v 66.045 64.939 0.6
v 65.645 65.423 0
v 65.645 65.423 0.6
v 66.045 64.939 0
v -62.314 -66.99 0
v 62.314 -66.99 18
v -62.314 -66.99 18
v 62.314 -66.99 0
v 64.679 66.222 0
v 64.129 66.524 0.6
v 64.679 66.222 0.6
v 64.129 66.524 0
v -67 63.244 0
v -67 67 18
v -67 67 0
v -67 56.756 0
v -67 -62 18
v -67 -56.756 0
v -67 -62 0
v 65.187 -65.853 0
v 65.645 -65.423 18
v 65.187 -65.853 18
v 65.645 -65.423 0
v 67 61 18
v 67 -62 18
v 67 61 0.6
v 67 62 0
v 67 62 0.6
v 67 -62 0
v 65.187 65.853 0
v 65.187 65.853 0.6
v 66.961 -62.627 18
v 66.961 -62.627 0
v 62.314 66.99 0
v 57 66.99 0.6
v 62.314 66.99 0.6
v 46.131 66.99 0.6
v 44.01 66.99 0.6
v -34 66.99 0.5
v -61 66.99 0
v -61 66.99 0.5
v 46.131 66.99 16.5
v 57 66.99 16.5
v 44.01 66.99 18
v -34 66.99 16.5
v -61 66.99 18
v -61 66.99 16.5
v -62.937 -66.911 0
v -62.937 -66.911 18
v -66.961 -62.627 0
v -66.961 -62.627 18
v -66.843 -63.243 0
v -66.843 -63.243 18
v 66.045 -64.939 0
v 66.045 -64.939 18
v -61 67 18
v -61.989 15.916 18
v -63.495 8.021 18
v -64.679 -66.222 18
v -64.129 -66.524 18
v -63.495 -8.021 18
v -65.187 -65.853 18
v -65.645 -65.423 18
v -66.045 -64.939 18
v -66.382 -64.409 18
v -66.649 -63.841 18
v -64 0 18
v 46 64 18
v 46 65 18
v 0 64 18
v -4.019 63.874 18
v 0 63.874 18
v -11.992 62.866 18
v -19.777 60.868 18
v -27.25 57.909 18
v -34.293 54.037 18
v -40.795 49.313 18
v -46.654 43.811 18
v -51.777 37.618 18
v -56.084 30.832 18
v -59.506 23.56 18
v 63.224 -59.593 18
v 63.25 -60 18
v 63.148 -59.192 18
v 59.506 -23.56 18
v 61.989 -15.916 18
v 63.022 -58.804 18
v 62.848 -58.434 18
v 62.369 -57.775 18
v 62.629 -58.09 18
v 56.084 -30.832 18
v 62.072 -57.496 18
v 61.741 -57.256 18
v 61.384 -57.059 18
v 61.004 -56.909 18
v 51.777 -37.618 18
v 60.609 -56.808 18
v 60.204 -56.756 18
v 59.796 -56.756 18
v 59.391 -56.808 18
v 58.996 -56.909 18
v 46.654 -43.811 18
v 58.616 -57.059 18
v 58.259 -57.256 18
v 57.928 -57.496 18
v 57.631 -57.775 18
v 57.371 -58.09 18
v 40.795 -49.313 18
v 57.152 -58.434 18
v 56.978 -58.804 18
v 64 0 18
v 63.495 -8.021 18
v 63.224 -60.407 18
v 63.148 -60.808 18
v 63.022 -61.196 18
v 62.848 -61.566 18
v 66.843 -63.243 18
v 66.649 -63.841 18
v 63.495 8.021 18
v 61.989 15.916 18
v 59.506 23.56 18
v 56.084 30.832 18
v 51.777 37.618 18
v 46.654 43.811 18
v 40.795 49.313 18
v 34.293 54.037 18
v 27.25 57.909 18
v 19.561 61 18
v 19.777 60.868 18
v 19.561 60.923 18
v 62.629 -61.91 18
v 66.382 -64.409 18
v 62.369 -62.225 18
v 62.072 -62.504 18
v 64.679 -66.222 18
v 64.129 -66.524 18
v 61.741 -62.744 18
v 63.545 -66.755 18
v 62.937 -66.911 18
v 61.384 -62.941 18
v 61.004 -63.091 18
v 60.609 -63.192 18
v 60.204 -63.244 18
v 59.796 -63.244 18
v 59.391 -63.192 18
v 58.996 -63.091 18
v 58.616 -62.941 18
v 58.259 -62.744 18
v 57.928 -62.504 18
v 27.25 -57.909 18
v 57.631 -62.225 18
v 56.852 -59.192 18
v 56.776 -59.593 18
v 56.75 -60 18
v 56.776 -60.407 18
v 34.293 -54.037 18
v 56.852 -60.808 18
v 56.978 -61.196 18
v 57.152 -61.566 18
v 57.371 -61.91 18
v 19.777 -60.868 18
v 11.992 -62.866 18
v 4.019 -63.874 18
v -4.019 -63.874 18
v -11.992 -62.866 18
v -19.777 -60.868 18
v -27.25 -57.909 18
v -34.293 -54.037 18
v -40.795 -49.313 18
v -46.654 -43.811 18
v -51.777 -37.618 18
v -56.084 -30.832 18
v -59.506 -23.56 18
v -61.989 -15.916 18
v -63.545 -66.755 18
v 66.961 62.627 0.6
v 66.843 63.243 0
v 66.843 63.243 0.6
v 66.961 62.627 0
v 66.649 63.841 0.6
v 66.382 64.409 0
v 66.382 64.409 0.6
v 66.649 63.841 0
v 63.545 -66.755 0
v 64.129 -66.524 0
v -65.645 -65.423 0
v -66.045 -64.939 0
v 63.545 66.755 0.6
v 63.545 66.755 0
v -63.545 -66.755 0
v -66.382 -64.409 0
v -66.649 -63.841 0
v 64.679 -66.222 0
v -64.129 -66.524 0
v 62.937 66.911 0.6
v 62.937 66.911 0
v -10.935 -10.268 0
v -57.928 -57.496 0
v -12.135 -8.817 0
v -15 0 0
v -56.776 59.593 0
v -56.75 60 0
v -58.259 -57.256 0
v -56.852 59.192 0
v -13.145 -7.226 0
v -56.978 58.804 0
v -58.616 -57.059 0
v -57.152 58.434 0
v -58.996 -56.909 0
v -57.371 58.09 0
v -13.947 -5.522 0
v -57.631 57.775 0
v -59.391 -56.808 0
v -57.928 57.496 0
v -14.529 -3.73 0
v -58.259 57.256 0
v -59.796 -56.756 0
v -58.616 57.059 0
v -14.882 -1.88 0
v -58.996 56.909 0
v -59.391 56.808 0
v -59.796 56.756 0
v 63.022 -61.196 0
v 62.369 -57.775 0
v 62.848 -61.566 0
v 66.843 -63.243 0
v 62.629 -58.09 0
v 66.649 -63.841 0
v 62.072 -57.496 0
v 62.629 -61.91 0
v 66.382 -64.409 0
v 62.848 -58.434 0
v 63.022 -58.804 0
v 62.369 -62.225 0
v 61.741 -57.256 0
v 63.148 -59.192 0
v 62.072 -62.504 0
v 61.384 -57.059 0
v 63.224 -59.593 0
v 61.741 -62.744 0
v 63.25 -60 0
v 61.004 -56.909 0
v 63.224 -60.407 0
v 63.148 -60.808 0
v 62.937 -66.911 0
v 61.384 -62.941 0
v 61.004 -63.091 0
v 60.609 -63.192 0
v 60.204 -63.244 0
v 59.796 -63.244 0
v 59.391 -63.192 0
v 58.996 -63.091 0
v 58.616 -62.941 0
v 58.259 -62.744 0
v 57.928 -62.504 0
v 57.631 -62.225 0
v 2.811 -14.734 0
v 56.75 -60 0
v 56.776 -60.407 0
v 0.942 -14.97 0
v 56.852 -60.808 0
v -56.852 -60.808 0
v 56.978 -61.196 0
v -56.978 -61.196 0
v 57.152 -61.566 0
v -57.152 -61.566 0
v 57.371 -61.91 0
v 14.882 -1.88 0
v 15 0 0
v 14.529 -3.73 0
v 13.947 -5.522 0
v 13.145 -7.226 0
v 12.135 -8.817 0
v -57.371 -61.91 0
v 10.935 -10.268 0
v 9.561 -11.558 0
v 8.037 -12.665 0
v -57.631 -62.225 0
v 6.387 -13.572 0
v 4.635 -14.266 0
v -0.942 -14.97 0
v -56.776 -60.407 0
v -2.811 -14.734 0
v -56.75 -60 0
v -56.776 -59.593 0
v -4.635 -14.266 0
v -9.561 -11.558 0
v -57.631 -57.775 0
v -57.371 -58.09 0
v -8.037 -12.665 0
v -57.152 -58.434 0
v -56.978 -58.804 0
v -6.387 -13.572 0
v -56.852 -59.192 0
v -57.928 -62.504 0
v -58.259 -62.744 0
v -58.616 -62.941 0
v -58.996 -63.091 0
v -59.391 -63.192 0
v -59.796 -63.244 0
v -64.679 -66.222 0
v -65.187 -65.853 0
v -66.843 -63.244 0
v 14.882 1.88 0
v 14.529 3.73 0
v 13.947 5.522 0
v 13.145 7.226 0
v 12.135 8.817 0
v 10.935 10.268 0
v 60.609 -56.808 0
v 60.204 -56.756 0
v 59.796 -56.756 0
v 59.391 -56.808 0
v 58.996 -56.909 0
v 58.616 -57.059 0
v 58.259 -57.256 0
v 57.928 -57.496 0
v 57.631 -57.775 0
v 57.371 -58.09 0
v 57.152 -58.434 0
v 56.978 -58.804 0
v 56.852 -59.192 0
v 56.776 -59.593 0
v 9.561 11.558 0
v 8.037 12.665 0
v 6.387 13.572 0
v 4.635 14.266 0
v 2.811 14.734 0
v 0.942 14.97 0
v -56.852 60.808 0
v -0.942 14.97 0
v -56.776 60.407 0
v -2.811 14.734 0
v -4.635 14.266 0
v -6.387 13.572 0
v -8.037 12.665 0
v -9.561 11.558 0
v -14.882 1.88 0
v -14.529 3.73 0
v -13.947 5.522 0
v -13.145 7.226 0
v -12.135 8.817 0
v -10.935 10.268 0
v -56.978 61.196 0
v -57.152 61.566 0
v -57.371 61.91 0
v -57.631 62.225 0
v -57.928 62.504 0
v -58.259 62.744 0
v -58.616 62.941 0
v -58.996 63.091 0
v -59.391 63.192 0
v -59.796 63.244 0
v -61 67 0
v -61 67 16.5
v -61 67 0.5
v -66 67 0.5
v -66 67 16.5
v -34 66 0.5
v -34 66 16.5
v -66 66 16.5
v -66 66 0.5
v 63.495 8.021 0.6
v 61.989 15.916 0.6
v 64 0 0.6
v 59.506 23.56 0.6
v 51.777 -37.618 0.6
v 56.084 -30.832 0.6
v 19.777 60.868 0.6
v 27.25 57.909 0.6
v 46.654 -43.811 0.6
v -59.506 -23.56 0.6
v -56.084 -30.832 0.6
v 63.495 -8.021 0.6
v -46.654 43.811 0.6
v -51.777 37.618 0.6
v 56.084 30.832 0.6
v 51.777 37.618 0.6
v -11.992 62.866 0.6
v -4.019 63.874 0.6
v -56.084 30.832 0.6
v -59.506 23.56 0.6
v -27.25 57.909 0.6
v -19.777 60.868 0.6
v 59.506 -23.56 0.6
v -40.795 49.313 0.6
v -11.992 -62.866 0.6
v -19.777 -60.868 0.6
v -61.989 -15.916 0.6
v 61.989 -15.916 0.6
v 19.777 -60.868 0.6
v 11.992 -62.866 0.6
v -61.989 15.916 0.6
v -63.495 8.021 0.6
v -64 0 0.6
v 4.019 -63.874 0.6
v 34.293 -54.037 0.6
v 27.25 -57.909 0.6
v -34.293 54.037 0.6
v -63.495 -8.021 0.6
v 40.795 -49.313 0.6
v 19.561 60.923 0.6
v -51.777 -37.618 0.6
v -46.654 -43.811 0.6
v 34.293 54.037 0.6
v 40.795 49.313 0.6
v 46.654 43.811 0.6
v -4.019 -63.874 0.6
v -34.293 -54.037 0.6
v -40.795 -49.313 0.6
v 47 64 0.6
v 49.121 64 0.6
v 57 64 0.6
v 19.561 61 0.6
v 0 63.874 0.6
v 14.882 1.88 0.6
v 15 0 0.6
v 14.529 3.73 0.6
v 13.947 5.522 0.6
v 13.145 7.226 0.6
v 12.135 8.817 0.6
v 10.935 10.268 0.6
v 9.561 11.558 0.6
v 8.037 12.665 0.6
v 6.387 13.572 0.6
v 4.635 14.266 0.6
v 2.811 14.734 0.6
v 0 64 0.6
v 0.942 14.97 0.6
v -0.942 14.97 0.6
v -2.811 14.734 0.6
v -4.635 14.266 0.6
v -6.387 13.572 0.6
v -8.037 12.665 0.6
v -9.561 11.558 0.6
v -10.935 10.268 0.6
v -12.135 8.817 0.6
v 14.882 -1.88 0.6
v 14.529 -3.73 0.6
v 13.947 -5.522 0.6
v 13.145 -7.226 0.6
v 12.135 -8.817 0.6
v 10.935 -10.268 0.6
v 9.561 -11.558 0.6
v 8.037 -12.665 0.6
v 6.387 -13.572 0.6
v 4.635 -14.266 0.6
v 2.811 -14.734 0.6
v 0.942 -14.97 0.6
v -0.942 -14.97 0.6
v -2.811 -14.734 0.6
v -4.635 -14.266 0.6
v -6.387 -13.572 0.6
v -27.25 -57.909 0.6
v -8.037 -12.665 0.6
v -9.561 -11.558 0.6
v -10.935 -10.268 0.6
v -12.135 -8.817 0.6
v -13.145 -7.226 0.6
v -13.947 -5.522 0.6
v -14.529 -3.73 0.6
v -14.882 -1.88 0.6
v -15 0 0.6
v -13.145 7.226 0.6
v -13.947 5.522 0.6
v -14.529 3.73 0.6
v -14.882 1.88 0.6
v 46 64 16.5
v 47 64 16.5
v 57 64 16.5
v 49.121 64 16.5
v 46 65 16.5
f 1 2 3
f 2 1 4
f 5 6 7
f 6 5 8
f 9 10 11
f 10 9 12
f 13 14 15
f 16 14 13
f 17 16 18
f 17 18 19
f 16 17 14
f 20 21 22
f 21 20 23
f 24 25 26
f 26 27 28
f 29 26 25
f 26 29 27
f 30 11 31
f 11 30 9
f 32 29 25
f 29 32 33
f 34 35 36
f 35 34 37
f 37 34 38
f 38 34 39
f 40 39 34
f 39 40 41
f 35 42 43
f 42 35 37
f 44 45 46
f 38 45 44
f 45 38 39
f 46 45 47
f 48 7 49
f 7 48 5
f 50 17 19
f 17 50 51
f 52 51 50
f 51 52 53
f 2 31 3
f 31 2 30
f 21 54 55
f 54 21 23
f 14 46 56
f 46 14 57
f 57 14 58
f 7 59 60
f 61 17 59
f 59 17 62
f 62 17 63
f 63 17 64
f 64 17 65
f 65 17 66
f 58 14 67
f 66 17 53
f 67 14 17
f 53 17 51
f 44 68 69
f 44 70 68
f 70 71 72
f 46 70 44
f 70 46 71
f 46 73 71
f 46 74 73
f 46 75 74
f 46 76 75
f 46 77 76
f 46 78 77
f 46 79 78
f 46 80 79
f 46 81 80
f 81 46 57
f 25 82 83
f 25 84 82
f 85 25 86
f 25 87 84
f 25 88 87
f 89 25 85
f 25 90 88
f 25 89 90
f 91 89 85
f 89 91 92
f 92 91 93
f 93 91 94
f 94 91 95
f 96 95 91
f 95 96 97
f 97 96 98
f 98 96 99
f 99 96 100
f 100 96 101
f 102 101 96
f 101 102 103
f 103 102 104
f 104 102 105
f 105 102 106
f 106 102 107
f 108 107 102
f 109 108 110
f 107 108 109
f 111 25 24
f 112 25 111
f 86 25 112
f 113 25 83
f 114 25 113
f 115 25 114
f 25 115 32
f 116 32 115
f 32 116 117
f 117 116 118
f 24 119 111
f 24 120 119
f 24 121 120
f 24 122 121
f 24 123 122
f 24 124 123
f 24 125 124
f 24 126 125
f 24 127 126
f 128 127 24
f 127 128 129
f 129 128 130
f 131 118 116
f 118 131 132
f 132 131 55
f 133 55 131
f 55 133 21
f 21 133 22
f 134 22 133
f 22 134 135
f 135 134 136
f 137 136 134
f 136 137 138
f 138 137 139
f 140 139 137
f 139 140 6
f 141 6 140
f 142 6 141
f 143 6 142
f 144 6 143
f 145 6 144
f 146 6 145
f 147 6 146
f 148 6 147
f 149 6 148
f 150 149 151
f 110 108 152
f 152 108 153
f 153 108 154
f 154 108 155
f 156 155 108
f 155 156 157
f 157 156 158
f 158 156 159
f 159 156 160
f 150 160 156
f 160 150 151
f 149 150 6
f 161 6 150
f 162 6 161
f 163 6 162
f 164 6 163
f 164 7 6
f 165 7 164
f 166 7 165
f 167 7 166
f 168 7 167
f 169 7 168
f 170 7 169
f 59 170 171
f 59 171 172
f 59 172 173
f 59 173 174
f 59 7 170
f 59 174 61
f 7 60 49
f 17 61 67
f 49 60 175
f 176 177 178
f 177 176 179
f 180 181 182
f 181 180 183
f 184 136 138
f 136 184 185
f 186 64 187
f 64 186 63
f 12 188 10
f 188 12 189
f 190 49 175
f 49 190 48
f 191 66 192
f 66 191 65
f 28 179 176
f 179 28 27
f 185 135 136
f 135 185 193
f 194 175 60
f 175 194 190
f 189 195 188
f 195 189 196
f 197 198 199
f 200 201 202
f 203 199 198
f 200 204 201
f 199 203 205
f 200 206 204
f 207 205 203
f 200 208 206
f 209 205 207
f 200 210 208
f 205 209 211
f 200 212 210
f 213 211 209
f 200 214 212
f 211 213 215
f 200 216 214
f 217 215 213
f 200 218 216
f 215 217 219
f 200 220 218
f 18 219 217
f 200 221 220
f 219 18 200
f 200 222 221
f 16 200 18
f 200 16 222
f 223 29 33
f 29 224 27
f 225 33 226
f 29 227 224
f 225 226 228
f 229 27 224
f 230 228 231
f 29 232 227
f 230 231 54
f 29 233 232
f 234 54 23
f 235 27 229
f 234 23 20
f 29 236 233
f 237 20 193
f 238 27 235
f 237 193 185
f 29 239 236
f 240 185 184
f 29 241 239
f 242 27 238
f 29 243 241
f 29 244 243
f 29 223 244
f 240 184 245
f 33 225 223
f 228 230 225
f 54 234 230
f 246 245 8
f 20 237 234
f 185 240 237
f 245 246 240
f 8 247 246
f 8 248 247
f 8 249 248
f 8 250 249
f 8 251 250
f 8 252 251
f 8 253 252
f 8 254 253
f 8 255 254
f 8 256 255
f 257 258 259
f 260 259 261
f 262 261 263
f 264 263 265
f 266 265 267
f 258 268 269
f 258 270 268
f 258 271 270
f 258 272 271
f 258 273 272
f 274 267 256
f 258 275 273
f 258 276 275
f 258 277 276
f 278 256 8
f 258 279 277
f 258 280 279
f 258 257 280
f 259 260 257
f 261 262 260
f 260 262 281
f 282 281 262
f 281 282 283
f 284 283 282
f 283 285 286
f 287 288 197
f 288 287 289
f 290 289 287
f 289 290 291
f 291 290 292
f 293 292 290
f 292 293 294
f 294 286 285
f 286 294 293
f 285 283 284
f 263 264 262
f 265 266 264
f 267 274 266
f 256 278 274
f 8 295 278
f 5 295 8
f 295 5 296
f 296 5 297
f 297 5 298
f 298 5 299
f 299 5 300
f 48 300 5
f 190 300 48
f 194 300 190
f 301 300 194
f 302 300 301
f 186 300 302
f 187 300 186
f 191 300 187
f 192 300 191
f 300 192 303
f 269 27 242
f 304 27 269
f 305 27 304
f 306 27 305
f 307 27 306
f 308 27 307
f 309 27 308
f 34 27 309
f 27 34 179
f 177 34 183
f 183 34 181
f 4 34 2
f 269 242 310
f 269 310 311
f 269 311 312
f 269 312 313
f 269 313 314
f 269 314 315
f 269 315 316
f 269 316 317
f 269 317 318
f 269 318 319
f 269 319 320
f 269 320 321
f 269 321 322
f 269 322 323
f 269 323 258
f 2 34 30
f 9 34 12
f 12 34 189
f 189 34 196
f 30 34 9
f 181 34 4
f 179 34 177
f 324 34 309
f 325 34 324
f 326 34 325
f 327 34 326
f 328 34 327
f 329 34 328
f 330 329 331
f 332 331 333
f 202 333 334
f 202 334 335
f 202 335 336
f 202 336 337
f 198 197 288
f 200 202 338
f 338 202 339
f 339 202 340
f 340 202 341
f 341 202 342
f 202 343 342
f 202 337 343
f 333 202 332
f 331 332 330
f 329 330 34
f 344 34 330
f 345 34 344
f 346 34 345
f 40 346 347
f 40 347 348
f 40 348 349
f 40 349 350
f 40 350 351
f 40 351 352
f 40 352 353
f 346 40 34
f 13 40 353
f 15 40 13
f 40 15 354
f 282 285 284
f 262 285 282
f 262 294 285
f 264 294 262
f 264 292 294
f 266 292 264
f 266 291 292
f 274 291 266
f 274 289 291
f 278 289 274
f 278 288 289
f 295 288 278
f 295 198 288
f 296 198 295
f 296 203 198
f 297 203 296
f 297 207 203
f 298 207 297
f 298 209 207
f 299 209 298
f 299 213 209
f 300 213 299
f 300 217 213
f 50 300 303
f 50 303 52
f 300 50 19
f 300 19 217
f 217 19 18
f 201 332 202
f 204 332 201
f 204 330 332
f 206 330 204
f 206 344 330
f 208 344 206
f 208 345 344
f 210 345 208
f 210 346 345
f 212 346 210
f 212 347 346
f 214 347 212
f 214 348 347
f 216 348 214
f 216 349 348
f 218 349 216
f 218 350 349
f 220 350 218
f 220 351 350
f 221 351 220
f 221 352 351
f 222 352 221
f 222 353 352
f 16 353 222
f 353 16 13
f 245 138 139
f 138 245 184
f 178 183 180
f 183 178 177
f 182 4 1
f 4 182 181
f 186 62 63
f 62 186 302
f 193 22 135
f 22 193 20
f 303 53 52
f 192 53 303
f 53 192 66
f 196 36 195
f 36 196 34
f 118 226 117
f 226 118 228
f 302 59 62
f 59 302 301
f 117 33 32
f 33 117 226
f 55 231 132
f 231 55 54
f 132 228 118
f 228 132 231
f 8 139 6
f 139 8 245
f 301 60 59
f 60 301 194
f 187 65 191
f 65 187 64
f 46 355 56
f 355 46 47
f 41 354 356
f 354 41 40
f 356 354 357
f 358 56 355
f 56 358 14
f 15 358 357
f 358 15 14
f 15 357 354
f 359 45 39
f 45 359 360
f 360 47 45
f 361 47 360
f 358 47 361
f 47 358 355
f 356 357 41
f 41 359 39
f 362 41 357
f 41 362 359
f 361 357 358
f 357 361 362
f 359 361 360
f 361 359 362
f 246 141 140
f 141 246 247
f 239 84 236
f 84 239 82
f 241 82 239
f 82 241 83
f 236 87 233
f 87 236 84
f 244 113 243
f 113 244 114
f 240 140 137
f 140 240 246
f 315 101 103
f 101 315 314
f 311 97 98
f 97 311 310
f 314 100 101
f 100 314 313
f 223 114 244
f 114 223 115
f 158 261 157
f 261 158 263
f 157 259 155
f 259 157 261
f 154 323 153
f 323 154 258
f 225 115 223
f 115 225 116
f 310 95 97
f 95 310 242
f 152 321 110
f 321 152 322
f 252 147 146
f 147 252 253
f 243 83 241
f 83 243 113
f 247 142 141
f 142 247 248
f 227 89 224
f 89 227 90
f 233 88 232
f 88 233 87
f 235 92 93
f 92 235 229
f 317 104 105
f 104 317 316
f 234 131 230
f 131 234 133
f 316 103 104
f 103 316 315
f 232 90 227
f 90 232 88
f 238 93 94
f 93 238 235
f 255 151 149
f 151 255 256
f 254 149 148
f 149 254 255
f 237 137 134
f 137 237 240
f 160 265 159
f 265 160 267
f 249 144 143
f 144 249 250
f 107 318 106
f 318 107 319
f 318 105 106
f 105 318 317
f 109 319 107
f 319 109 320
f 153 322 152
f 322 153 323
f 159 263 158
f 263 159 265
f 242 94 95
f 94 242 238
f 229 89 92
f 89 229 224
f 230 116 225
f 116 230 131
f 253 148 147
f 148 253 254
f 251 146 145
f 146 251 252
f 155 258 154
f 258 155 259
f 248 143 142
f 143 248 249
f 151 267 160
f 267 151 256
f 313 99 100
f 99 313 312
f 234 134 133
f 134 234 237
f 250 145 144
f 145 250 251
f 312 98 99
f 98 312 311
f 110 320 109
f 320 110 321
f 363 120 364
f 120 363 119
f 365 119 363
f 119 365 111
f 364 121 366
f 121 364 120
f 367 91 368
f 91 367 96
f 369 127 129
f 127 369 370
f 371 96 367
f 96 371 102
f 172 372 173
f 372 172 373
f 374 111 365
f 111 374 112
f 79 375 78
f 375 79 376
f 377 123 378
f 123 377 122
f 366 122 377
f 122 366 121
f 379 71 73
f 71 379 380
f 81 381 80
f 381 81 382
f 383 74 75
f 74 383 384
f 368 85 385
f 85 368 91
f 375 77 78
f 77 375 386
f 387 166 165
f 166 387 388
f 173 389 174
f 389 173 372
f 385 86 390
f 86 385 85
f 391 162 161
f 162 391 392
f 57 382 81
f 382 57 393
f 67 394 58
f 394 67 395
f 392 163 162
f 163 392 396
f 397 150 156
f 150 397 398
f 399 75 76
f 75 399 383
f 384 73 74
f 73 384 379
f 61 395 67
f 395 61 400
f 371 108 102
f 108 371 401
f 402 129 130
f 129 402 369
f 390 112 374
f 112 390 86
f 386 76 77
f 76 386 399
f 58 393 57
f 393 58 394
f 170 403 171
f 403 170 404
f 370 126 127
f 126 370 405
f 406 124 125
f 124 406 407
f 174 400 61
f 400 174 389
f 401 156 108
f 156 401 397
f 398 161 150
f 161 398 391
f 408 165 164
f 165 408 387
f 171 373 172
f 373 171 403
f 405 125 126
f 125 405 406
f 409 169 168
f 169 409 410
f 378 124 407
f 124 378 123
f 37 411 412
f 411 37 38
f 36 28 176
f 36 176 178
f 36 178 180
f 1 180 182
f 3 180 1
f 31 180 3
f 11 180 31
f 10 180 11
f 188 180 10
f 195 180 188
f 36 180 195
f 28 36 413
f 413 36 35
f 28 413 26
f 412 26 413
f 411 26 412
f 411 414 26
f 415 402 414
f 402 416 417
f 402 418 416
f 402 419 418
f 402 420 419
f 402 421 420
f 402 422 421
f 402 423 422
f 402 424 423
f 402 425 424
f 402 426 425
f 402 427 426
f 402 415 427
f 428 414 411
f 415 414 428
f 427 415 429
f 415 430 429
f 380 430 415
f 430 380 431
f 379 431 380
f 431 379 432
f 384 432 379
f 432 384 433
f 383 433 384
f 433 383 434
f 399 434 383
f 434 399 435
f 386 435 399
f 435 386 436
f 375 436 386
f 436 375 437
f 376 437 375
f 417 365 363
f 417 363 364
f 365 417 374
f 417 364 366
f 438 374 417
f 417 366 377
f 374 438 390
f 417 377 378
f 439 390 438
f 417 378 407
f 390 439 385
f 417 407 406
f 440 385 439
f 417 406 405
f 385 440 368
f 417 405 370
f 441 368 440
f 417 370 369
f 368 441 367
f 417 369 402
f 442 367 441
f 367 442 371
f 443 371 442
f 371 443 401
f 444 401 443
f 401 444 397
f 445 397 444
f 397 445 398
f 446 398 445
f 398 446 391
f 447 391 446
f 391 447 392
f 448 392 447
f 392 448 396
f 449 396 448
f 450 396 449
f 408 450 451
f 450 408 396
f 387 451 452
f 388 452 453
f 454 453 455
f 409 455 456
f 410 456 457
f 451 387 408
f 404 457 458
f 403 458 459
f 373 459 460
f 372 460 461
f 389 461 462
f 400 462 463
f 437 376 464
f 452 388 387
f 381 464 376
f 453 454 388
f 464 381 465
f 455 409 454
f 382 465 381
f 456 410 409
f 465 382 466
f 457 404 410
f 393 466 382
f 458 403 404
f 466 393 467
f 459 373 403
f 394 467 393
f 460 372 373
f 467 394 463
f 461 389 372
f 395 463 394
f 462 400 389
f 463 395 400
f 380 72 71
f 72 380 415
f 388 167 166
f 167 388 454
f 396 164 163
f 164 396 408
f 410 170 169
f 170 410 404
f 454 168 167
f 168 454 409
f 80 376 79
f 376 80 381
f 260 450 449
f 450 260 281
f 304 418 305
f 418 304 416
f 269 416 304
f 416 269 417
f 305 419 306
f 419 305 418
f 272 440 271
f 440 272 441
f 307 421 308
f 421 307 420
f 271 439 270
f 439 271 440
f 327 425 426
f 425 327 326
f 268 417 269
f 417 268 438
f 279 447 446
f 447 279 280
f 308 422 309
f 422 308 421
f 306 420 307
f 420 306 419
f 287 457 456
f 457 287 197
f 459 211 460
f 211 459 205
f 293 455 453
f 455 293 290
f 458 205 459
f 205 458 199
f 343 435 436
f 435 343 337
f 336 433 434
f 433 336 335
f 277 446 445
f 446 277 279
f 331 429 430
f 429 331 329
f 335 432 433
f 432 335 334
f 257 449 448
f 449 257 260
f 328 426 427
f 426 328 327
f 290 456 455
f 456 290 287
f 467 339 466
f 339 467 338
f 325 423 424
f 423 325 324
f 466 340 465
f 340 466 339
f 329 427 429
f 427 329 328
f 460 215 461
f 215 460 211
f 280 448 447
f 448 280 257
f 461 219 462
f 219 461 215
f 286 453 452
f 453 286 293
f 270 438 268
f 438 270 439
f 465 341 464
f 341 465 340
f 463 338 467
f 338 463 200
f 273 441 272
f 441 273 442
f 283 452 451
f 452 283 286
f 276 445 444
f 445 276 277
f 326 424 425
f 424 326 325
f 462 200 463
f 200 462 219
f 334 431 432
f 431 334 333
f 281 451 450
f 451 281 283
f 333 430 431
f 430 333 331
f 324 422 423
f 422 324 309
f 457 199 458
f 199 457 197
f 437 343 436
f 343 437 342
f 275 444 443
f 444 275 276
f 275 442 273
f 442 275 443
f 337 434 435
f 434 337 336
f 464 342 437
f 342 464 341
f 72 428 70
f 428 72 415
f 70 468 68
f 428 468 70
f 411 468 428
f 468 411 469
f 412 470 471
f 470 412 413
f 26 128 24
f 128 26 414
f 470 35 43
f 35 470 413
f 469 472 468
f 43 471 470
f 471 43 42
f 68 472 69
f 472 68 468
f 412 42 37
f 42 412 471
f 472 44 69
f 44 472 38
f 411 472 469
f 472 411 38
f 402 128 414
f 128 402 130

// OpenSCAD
$fn = 50;


difference() {
	union() {
		hull() {
			translate(v = [-62.0000000000, 62.0000000000, 0]) {
				cylinder(h = 18, r = 5);
			}
			translate(v = [62.0000000000, 62.0000000000, 0]) {
				cylinder(h = 18, r = 5);
			}
			translate(v = [-62.0000000000, -62.0000000000, 0]) {
				cylinder(h = 18, r = 5);
			}
			translate(v = [62.0000000000, -62.0000000000, 0]) {
				cylinder(h = 18, r = 5);
			}
		}
		translate(v = [-67.0000000000, 61.0000000000, 0]) {
			cube(size = [6, 6, 18]);
		}
	}
	union() {
		translate(v = [-67.5000000000, -60.0000000000, -250.0000000000]) {
			rotate(a = [0, 0, 0]) {
				difference() {
					union() {
						hull() {
							translate(v = [7.5000000000, 0, 0]) {
								cylinder(h = 250, r = 3.2500000000, r1 = 3.2500000000, r2 = 3.2500000000);
							}
							translate(v = [-7.5000000000, 0, 0]) {
								cylinder(h = 250, r = 3.2500000000, r1 = 3.2500000000, r2 = 3.2500000000);
							}
						}
					}
					union();
				}
			}
		}
		translate(v = [-67.5000000000, 60.0000000000, -250.0000000000]) {
			rotate(a = [0, 0, 0]) {
				difference() {
					union() {
						hull() {
							translate(v = [7.5000000000, 0, 0]) {
								cylinder(h = 250, r = 3.2500000000, r1 = 3.2500000000, r2 = 3.2500000000);
							}
							translate(v = [-7.5000000000, 0, 0]) {
								cylinder(h = 250, r = 3.2500000000, r1 = 3.2500000000, r2 = 3.2500000000);
							}
						}
					}
					union();
				}
			}
		}
		translate(v = [-66.0000000000, 66.0000000000, 0.5000000000]) {
			cube(size = [32, 1, 16]);
		}
		translate(v = [60.0000000000, -60.0000000000, -50.0000000000]) {
			cylinder(h = 100, r = 3.2500000000);
		}
		translate(v = [0, 0, 0.6000000000]) {
			cylinder(h = 20.4000000000, r = 64.0000000000);
		}
		translate(v = [0, 0, -9.0000000000]) {
			cylinder(h = 18, r = 15.0000000000);
		}
		translate(v = [0.0000000000, 61.0000000000, 0.6000000000]) {
			cube(size = [67.0000000000, 3, 20.4000000000]);
		}
		translate(v = [57.0000000000, 61.0000000000, 0.6000000000]) {
			cube(size = [10, 6, 20.4000000000]);
		}
		translate(v = [46.0000000000, 61.0000000000, 16.5000000000]) {
			cube(size = [21, 6, 1.5000000000]);
		}
		translate(v = [43.2500000000, 67.7500000000, 0.6000000000]) {
			rotate(a = [0, 0, -45]) {
				cube(size = [7.5000000000, 1.5000000000, 20.4000000000]);
			}
		}
		translate(v = [12.0610000000, 59.0000000000, 0.6000000000]) {
			cube(size = [7.5000000000, 2, 17.4000000000]);
		}
	}
}
